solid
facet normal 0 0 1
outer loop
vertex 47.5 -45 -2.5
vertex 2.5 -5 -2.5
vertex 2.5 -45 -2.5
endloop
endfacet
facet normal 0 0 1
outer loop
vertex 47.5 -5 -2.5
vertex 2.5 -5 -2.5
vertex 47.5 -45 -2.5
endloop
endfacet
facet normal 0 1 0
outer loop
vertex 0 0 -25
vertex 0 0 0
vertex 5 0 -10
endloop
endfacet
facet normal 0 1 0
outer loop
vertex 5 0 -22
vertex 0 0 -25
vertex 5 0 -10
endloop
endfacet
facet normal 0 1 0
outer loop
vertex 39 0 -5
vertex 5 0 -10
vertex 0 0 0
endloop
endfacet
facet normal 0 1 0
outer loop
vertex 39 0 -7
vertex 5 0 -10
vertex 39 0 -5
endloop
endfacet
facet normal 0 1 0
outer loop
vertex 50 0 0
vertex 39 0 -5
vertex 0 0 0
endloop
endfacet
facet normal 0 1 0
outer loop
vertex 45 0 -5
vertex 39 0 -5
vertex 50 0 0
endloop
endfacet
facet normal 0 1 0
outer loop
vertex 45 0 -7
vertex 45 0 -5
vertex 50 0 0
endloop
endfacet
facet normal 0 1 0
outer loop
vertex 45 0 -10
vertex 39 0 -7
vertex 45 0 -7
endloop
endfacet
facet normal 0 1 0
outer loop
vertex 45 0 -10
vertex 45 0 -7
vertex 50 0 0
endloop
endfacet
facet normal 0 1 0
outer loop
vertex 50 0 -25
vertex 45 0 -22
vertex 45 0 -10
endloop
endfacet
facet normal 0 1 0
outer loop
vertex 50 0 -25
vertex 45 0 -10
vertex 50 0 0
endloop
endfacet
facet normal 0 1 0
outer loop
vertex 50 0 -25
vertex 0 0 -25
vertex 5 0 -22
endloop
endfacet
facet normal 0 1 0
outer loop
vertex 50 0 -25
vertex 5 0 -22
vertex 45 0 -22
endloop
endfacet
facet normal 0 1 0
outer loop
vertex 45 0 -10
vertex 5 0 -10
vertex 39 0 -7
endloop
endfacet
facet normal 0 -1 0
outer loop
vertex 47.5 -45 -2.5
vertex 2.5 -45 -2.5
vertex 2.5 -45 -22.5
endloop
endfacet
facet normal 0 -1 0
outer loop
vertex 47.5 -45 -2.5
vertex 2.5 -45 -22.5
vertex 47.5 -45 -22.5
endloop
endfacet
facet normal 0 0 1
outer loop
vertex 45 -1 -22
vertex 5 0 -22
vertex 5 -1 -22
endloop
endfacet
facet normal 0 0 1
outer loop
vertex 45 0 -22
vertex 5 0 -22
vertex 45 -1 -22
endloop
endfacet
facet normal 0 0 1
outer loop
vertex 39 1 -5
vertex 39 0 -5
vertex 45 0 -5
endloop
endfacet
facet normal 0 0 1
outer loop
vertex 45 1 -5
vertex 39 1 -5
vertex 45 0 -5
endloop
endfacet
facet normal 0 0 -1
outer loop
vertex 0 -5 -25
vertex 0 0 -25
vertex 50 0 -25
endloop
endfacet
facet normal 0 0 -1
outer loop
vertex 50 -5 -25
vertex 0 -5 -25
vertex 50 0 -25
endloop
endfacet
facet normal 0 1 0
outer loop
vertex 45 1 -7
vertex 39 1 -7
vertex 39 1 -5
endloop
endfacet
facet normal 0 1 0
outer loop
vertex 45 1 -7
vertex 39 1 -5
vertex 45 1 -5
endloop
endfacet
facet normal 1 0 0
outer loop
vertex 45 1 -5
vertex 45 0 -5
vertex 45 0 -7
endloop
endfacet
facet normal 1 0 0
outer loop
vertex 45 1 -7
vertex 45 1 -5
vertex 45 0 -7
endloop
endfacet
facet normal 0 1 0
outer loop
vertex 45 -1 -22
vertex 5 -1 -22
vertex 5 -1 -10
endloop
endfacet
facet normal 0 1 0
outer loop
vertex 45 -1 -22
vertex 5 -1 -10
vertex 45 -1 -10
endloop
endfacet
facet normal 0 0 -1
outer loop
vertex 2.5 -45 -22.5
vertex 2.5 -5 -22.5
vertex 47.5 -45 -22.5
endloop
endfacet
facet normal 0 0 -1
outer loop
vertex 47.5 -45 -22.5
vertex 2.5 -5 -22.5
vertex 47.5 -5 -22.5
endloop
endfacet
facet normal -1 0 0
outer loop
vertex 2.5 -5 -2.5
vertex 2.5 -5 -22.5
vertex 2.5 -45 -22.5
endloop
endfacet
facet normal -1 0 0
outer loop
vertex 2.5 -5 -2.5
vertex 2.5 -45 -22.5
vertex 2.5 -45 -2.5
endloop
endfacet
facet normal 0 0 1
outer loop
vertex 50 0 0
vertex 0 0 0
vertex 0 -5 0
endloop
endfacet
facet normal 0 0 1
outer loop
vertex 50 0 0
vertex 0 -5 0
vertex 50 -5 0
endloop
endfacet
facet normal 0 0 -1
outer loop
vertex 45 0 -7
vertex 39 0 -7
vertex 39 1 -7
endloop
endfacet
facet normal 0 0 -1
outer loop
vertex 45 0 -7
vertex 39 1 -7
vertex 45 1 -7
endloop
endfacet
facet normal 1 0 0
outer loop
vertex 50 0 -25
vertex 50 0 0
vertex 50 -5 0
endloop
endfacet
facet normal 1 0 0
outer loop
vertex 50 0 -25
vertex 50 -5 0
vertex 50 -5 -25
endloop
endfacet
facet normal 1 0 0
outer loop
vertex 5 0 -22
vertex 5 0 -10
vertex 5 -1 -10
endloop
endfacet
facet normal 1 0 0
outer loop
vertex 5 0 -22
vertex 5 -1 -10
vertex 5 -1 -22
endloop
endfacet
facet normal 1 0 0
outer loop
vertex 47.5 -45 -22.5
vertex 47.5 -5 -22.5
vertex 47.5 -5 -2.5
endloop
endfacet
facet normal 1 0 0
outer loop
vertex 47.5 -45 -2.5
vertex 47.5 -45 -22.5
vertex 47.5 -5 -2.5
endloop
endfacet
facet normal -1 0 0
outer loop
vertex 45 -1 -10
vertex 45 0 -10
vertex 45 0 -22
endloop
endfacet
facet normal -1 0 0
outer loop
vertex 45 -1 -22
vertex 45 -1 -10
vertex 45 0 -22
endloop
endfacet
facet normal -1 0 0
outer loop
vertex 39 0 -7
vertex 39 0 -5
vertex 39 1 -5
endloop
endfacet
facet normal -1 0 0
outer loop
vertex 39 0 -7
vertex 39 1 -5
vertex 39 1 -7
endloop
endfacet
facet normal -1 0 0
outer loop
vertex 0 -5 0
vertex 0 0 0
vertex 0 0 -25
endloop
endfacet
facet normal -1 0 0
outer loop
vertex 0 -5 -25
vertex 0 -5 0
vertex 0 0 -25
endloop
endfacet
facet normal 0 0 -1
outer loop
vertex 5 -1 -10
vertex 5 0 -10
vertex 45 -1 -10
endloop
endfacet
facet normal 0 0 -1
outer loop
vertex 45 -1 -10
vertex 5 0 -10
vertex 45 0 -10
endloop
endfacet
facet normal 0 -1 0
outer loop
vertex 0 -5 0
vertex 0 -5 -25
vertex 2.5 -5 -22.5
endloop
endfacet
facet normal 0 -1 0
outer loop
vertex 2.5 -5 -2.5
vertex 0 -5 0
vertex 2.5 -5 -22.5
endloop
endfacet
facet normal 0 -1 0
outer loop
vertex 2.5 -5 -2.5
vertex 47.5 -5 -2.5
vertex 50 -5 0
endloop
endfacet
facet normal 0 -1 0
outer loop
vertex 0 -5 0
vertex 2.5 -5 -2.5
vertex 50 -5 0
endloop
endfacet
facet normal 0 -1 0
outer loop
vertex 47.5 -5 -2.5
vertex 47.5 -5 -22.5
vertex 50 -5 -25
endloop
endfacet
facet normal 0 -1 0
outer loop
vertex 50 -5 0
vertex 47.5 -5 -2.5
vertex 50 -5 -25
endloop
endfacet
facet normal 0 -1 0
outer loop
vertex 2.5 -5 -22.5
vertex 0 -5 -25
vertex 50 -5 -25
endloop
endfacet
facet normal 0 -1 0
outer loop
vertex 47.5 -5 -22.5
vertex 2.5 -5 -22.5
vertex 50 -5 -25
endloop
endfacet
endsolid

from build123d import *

# Parameters (mm, degrees)
SKETCH1_W           = 50
SKETCH1_H           = 25
BOSS_EXTRUDE1_DEPTH = 5
SKETCH2_W           = 45
SKETCH2_H           = 20
BOSS_EXTRUDE2_DEPTH = 40
SKETCH3_W           = 40
SKETCH3_H           = 12
CUT_EXTRUDE1_DEPTH  = 1
SKETCH4_W           = 6
SKETCH4_H           = 2
BOSS_EXTRUDE3_DEPTH = 1


with BuildPart() as part:
    # Sketch1 → Boss-Extrude1 (new body)
    with BuildSketch(Plane(origin=(0, 0, 0), x_dir=(1, 0, 0), z_dir=(0, 1, 0))):
        with Locations((25, 12.5)):
            Rectangle(SKETCH1_W, SKETCH1_H)
    extrude(amount=-BOSS_EXTRUDE1_DEPTH)

    # Sketch2 → Boss-Extrude2 (add)
    with BuildSketch(Plane.XZ.offset(5)):
        with Locations((25, -12.5)):
            Rectangle(SKETCH2_W, SKETCH2_H)
    extrude(amount=BOSS_EXTRUDE2_DEPTH)

    # Sketch3 → Cut-Extrude1 (cut)
    with BuildSketch(Plane(origin=(0, 0, 0), x_dir=(1, 0, 0), z_dir=(0, 1, 0))):
        with Locations((25, 16)):
            Rectangle(SKETCH3_W, SKETCH3_H)
    extrude(amount=-CUT_EXTRUDE1_DEPTH, mode=Mode.SUBTRACT)

    # Sketch4 → Boss-Extrude3 (add)
    with BuildSketch(Plane(origin=(0, 0, 0), x_dir=(1, 0, 0), z_dir=(0, 1, 0))):
        with Locations((42, 6)):
            Rectangle(SKETCH4_W, SKETCH4_H)
    extrude(amount=BOSS_EXTRUDE3_DEPTH)


solid = part.part
